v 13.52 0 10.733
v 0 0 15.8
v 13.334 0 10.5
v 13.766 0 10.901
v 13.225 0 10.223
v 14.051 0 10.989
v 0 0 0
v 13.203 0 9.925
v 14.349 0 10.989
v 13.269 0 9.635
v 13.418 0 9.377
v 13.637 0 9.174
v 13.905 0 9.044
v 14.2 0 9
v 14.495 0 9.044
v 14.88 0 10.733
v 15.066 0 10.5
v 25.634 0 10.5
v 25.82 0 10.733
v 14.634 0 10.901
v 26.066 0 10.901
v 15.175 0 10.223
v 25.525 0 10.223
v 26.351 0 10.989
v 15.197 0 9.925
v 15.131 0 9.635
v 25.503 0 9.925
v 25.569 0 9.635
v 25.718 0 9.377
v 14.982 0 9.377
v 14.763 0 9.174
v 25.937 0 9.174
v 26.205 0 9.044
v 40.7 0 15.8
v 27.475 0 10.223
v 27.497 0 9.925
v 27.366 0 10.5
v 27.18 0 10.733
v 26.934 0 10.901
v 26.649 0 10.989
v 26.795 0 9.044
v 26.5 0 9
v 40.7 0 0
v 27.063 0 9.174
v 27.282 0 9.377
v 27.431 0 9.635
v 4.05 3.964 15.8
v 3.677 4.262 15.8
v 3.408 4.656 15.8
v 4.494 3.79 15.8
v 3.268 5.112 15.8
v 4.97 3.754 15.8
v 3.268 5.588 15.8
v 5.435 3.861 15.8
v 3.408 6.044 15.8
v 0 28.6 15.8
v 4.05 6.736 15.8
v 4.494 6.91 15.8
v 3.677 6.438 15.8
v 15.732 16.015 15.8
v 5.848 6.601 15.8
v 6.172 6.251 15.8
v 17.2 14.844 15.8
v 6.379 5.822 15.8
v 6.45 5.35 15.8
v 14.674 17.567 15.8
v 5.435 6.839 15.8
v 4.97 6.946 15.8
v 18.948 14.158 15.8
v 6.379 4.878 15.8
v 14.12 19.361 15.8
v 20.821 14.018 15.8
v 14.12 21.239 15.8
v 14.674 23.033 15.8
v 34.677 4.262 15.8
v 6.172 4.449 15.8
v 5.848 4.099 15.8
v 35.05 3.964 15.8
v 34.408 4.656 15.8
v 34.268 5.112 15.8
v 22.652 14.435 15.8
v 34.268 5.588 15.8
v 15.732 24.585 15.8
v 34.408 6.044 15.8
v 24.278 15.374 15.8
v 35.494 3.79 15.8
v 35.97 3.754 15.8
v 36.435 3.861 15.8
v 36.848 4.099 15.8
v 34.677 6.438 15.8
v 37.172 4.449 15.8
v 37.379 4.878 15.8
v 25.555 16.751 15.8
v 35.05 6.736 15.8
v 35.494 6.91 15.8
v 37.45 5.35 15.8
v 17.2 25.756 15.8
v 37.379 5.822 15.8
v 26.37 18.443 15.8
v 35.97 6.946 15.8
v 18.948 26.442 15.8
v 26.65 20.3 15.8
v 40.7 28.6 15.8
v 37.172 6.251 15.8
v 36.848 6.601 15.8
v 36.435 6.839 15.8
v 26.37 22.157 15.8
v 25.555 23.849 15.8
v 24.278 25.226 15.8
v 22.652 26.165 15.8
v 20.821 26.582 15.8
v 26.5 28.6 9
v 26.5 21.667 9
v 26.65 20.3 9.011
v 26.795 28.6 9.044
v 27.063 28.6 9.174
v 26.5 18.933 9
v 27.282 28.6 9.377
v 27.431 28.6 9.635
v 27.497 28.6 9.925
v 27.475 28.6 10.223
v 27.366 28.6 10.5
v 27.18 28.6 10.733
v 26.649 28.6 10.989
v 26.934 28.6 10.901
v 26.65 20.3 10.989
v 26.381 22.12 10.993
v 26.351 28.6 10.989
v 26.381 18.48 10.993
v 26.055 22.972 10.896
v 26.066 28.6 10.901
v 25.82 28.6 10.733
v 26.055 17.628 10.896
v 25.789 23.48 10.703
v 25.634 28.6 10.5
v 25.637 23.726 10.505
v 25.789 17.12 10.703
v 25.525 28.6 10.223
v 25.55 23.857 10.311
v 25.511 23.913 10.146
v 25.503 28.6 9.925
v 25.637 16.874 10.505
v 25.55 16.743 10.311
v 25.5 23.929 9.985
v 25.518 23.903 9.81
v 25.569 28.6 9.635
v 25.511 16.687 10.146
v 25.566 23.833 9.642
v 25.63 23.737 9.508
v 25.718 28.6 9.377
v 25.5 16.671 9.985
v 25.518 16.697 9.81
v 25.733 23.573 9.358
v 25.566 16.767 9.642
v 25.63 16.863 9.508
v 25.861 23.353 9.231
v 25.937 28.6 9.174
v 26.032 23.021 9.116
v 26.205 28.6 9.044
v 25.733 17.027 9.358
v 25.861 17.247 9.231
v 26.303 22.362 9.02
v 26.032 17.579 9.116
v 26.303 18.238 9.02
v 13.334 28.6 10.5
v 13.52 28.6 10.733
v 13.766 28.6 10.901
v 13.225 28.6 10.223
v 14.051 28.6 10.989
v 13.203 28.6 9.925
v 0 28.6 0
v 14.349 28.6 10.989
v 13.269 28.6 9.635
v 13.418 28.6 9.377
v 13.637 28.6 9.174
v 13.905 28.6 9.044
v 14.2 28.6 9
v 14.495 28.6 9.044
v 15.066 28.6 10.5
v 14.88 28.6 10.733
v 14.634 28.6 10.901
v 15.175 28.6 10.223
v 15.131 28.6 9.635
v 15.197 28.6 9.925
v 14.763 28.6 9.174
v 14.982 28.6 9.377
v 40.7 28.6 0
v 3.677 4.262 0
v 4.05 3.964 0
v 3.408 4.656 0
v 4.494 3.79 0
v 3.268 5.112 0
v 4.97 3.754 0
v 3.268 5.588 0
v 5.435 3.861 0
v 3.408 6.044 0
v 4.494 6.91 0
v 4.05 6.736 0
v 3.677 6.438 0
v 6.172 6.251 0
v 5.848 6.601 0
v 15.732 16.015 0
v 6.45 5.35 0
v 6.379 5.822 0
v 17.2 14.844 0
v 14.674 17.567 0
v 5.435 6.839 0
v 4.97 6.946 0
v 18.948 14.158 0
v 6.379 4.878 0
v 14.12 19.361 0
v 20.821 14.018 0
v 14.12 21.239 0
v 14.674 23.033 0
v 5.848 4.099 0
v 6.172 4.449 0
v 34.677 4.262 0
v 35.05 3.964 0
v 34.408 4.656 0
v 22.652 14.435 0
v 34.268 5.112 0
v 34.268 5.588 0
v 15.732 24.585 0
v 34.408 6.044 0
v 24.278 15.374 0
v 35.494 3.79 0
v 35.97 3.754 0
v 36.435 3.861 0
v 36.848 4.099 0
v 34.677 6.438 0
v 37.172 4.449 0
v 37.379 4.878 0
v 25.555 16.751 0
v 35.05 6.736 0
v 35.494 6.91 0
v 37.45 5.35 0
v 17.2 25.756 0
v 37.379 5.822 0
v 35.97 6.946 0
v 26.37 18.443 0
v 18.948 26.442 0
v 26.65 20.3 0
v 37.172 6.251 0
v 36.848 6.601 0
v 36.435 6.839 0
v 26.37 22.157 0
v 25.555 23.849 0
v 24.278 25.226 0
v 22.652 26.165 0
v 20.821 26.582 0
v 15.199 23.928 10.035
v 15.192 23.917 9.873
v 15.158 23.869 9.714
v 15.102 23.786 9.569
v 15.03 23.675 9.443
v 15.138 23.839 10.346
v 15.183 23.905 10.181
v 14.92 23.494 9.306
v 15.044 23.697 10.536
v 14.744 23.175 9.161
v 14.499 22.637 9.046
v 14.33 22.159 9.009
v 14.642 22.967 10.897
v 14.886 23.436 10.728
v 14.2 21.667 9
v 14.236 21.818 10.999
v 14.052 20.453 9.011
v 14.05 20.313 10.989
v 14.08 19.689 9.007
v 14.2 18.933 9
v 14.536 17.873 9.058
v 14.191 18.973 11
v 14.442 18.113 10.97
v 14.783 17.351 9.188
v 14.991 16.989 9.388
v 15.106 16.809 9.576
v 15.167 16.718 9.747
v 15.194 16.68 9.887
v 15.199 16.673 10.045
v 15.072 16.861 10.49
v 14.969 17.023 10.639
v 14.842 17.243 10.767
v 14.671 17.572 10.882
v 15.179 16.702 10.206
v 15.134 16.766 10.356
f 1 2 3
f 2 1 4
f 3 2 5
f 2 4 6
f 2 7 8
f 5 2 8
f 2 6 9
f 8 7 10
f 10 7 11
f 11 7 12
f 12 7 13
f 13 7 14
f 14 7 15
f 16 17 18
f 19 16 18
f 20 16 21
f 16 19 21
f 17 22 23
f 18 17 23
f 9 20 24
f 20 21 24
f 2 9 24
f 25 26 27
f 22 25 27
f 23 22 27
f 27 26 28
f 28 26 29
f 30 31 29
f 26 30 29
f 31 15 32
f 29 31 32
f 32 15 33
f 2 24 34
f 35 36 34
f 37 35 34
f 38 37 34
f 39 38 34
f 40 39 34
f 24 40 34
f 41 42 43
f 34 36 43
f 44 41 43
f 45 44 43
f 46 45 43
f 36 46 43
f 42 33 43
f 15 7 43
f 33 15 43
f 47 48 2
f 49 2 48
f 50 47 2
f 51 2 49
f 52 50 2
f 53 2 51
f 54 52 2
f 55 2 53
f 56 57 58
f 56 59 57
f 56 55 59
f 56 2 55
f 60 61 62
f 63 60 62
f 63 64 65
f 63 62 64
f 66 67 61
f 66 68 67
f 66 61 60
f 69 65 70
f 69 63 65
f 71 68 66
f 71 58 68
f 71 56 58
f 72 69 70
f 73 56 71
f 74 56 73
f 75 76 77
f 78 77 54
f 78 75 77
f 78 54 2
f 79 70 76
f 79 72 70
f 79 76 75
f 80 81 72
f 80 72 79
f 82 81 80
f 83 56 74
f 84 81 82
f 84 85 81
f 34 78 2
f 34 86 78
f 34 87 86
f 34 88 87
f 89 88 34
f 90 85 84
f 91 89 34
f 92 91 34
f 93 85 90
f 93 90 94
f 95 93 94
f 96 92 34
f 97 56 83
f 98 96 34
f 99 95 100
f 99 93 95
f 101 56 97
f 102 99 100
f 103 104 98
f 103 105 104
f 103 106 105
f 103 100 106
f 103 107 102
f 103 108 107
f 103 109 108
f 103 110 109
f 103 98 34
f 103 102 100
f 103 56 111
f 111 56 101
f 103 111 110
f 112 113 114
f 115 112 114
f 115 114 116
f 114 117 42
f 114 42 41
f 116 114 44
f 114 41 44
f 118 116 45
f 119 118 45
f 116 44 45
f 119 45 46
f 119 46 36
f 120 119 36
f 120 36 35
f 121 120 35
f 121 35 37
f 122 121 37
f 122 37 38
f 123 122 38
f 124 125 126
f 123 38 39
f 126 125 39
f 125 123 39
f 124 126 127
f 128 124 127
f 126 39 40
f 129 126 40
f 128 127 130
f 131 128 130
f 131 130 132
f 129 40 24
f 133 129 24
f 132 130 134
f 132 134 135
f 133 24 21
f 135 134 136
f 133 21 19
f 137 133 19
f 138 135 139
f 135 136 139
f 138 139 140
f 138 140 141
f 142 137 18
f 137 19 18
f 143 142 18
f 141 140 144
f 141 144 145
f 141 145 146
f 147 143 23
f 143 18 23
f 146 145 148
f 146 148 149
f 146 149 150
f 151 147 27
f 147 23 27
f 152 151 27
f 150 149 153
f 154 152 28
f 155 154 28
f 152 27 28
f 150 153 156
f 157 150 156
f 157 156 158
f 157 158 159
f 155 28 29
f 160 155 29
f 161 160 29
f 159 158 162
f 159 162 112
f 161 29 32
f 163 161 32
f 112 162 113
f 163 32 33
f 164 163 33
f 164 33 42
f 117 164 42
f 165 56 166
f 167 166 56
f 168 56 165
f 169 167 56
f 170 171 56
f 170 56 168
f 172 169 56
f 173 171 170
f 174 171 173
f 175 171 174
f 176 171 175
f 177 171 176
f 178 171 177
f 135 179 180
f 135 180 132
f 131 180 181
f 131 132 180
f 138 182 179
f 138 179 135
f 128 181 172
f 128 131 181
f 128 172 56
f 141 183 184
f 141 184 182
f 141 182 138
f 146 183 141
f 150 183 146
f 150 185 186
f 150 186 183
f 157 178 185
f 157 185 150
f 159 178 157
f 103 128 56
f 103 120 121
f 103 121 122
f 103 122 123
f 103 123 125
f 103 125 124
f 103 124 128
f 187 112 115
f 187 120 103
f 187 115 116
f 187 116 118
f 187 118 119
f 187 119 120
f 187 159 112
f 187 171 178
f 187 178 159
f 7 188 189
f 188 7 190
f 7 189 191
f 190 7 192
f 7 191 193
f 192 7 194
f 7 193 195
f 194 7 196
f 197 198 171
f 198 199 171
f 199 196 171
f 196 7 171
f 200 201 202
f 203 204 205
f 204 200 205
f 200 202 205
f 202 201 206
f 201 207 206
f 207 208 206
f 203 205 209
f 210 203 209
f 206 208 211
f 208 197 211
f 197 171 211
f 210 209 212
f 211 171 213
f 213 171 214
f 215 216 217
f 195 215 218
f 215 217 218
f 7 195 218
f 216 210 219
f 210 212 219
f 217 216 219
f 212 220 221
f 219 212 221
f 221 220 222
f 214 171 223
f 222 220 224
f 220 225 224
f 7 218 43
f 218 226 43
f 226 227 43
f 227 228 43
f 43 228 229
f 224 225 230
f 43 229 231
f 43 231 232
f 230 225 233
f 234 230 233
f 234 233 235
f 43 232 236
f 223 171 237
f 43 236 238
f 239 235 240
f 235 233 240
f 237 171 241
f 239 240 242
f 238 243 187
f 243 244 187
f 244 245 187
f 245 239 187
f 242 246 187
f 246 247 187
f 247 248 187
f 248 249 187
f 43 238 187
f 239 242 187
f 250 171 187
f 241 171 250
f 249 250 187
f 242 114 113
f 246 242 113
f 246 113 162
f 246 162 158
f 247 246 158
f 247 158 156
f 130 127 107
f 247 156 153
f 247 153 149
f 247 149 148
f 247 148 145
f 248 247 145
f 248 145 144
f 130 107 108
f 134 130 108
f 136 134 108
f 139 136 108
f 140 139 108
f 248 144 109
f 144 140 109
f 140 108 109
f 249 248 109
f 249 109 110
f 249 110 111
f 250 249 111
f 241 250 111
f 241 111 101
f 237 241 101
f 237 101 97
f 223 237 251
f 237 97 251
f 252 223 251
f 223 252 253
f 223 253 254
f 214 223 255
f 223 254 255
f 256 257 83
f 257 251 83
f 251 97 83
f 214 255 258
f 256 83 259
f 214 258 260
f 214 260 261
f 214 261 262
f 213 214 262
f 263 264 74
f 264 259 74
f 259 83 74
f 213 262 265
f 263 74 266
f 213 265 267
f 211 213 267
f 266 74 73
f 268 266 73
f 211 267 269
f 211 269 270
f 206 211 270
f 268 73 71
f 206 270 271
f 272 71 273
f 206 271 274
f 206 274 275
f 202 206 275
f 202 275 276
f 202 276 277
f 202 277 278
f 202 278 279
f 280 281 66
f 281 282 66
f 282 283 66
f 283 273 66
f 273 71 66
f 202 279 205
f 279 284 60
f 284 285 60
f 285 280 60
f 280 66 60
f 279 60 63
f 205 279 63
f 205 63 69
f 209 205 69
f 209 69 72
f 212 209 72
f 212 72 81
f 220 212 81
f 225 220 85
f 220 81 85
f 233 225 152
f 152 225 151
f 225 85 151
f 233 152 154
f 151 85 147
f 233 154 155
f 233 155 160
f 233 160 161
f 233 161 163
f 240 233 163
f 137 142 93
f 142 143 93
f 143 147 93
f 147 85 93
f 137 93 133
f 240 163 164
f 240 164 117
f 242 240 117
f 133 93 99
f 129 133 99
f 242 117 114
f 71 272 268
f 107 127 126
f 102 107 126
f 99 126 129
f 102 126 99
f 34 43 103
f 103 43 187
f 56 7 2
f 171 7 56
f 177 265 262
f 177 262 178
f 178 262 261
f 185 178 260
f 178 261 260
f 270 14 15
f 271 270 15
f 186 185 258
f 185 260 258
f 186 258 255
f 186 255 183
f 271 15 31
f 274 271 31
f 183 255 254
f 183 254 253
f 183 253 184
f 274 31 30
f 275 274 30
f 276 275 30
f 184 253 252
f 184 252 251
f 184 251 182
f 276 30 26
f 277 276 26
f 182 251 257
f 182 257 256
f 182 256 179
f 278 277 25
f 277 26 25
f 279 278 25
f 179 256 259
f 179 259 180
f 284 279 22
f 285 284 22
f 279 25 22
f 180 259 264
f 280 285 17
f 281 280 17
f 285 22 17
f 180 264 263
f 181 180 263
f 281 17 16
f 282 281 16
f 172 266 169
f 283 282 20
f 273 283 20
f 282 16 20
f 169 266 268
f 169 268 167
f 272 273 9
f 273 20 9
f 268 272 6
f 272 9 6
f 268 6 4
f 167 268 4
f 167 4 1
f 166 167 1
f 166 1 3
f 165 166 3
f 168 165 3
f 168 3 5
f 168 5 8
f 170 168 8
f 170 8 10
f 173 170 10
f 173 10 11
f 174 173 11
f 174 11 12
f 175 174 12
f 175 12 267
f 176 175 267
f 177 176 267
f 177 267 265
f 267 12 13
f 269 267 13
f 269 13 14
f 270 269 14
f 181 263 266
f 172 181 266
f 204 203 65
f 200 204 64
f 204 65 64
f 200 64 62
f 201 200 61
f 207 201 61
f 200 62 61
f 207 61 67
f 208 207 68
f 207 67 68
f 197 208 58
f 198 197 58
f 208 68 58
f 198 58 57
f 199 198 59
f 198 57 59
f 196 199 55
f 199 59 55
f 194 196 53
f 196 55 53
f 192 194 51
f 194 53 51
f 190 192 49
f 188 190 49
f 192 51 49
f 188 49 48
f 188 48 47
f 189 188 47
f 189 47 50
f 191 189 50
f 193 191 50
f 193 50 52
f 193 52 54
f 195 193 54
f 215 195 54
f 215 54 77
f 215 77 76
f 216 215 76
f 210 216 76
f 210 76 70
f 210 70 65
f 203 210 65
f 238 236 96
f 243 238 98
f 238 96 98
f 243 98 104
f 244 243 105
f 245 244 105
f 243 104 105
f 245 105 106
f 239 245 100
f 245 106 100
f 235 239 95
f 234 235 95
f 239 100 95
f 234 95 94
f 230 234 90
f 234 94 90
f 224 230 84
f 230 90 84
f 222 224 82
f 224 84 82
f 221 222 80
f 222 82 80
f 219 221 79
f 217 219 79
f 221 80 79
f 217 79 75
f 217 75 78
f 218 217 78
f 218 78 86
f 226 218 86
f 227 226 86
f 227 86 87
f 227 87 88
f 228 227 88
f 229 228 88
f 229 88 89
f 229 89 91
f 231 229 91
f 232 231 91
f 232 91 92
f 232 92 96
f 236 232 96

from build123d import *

# Parameters (mm, degrees)
SKETCH_1_W          = 40.7
SKETCH_1_H          = 28.6
EXTRUDE_1_DEPTH     = 15.8
SKETCH_2_R          = 1.6
SKETCH_2_R_2        = 6.3
CUT_EXTRUDE_1_DEPTH = 53.192815598
SKETCH_3_R          = 1
CUT_EXTRUDE_2_DEPTH = 53.192815598


with BuildPart() as part:
    # Эскиз1 → Бобышка-Вытянуть1 (new body)
    with BuildSketch(Plane.XY):
        with Locations((20.35, 14.3)):
            Rectangle(SKETCH_1_W, SKETCH_1_H)
    extrude(amount=EXTRUDE_1_DEPTH)

    # Эскиз2 → Вырез-Вытянуть1 (cut, through all)
    with BuildSketch(Plane.XY.offset(15.8)):
        with Locations((35.85, 5.35)):
            Circle(SKETCH_2_R)
        with Locations((4.85, 5.35)):
            Circle(SKETCH_2_R)
        with Locations((20.35, 20.3)):
            Circle(SKETCH_2_R_2)
    extrude(amount=-CUT_EXTRUDE_1_DEPTH, mode=Mode.SUBTRACT)

    # Эскиз3 → Вырез-Вытянуть2 (cut, through all)
    with BuildSketch(Plane.XZ):
        with Locations(Location((14.2, 10, 0), (0, 0, 270))):
            Circle(SKETCH_3_R)
        with Locations(Location((26.5, 10, 0), (0, 0, 270))):
            Circle(SKETCH_3_R)
    extrude(amount=-CUT_EXTRUDE_2_DEPTH, mode=Mode.SUBTRACT)


solid = part.part
